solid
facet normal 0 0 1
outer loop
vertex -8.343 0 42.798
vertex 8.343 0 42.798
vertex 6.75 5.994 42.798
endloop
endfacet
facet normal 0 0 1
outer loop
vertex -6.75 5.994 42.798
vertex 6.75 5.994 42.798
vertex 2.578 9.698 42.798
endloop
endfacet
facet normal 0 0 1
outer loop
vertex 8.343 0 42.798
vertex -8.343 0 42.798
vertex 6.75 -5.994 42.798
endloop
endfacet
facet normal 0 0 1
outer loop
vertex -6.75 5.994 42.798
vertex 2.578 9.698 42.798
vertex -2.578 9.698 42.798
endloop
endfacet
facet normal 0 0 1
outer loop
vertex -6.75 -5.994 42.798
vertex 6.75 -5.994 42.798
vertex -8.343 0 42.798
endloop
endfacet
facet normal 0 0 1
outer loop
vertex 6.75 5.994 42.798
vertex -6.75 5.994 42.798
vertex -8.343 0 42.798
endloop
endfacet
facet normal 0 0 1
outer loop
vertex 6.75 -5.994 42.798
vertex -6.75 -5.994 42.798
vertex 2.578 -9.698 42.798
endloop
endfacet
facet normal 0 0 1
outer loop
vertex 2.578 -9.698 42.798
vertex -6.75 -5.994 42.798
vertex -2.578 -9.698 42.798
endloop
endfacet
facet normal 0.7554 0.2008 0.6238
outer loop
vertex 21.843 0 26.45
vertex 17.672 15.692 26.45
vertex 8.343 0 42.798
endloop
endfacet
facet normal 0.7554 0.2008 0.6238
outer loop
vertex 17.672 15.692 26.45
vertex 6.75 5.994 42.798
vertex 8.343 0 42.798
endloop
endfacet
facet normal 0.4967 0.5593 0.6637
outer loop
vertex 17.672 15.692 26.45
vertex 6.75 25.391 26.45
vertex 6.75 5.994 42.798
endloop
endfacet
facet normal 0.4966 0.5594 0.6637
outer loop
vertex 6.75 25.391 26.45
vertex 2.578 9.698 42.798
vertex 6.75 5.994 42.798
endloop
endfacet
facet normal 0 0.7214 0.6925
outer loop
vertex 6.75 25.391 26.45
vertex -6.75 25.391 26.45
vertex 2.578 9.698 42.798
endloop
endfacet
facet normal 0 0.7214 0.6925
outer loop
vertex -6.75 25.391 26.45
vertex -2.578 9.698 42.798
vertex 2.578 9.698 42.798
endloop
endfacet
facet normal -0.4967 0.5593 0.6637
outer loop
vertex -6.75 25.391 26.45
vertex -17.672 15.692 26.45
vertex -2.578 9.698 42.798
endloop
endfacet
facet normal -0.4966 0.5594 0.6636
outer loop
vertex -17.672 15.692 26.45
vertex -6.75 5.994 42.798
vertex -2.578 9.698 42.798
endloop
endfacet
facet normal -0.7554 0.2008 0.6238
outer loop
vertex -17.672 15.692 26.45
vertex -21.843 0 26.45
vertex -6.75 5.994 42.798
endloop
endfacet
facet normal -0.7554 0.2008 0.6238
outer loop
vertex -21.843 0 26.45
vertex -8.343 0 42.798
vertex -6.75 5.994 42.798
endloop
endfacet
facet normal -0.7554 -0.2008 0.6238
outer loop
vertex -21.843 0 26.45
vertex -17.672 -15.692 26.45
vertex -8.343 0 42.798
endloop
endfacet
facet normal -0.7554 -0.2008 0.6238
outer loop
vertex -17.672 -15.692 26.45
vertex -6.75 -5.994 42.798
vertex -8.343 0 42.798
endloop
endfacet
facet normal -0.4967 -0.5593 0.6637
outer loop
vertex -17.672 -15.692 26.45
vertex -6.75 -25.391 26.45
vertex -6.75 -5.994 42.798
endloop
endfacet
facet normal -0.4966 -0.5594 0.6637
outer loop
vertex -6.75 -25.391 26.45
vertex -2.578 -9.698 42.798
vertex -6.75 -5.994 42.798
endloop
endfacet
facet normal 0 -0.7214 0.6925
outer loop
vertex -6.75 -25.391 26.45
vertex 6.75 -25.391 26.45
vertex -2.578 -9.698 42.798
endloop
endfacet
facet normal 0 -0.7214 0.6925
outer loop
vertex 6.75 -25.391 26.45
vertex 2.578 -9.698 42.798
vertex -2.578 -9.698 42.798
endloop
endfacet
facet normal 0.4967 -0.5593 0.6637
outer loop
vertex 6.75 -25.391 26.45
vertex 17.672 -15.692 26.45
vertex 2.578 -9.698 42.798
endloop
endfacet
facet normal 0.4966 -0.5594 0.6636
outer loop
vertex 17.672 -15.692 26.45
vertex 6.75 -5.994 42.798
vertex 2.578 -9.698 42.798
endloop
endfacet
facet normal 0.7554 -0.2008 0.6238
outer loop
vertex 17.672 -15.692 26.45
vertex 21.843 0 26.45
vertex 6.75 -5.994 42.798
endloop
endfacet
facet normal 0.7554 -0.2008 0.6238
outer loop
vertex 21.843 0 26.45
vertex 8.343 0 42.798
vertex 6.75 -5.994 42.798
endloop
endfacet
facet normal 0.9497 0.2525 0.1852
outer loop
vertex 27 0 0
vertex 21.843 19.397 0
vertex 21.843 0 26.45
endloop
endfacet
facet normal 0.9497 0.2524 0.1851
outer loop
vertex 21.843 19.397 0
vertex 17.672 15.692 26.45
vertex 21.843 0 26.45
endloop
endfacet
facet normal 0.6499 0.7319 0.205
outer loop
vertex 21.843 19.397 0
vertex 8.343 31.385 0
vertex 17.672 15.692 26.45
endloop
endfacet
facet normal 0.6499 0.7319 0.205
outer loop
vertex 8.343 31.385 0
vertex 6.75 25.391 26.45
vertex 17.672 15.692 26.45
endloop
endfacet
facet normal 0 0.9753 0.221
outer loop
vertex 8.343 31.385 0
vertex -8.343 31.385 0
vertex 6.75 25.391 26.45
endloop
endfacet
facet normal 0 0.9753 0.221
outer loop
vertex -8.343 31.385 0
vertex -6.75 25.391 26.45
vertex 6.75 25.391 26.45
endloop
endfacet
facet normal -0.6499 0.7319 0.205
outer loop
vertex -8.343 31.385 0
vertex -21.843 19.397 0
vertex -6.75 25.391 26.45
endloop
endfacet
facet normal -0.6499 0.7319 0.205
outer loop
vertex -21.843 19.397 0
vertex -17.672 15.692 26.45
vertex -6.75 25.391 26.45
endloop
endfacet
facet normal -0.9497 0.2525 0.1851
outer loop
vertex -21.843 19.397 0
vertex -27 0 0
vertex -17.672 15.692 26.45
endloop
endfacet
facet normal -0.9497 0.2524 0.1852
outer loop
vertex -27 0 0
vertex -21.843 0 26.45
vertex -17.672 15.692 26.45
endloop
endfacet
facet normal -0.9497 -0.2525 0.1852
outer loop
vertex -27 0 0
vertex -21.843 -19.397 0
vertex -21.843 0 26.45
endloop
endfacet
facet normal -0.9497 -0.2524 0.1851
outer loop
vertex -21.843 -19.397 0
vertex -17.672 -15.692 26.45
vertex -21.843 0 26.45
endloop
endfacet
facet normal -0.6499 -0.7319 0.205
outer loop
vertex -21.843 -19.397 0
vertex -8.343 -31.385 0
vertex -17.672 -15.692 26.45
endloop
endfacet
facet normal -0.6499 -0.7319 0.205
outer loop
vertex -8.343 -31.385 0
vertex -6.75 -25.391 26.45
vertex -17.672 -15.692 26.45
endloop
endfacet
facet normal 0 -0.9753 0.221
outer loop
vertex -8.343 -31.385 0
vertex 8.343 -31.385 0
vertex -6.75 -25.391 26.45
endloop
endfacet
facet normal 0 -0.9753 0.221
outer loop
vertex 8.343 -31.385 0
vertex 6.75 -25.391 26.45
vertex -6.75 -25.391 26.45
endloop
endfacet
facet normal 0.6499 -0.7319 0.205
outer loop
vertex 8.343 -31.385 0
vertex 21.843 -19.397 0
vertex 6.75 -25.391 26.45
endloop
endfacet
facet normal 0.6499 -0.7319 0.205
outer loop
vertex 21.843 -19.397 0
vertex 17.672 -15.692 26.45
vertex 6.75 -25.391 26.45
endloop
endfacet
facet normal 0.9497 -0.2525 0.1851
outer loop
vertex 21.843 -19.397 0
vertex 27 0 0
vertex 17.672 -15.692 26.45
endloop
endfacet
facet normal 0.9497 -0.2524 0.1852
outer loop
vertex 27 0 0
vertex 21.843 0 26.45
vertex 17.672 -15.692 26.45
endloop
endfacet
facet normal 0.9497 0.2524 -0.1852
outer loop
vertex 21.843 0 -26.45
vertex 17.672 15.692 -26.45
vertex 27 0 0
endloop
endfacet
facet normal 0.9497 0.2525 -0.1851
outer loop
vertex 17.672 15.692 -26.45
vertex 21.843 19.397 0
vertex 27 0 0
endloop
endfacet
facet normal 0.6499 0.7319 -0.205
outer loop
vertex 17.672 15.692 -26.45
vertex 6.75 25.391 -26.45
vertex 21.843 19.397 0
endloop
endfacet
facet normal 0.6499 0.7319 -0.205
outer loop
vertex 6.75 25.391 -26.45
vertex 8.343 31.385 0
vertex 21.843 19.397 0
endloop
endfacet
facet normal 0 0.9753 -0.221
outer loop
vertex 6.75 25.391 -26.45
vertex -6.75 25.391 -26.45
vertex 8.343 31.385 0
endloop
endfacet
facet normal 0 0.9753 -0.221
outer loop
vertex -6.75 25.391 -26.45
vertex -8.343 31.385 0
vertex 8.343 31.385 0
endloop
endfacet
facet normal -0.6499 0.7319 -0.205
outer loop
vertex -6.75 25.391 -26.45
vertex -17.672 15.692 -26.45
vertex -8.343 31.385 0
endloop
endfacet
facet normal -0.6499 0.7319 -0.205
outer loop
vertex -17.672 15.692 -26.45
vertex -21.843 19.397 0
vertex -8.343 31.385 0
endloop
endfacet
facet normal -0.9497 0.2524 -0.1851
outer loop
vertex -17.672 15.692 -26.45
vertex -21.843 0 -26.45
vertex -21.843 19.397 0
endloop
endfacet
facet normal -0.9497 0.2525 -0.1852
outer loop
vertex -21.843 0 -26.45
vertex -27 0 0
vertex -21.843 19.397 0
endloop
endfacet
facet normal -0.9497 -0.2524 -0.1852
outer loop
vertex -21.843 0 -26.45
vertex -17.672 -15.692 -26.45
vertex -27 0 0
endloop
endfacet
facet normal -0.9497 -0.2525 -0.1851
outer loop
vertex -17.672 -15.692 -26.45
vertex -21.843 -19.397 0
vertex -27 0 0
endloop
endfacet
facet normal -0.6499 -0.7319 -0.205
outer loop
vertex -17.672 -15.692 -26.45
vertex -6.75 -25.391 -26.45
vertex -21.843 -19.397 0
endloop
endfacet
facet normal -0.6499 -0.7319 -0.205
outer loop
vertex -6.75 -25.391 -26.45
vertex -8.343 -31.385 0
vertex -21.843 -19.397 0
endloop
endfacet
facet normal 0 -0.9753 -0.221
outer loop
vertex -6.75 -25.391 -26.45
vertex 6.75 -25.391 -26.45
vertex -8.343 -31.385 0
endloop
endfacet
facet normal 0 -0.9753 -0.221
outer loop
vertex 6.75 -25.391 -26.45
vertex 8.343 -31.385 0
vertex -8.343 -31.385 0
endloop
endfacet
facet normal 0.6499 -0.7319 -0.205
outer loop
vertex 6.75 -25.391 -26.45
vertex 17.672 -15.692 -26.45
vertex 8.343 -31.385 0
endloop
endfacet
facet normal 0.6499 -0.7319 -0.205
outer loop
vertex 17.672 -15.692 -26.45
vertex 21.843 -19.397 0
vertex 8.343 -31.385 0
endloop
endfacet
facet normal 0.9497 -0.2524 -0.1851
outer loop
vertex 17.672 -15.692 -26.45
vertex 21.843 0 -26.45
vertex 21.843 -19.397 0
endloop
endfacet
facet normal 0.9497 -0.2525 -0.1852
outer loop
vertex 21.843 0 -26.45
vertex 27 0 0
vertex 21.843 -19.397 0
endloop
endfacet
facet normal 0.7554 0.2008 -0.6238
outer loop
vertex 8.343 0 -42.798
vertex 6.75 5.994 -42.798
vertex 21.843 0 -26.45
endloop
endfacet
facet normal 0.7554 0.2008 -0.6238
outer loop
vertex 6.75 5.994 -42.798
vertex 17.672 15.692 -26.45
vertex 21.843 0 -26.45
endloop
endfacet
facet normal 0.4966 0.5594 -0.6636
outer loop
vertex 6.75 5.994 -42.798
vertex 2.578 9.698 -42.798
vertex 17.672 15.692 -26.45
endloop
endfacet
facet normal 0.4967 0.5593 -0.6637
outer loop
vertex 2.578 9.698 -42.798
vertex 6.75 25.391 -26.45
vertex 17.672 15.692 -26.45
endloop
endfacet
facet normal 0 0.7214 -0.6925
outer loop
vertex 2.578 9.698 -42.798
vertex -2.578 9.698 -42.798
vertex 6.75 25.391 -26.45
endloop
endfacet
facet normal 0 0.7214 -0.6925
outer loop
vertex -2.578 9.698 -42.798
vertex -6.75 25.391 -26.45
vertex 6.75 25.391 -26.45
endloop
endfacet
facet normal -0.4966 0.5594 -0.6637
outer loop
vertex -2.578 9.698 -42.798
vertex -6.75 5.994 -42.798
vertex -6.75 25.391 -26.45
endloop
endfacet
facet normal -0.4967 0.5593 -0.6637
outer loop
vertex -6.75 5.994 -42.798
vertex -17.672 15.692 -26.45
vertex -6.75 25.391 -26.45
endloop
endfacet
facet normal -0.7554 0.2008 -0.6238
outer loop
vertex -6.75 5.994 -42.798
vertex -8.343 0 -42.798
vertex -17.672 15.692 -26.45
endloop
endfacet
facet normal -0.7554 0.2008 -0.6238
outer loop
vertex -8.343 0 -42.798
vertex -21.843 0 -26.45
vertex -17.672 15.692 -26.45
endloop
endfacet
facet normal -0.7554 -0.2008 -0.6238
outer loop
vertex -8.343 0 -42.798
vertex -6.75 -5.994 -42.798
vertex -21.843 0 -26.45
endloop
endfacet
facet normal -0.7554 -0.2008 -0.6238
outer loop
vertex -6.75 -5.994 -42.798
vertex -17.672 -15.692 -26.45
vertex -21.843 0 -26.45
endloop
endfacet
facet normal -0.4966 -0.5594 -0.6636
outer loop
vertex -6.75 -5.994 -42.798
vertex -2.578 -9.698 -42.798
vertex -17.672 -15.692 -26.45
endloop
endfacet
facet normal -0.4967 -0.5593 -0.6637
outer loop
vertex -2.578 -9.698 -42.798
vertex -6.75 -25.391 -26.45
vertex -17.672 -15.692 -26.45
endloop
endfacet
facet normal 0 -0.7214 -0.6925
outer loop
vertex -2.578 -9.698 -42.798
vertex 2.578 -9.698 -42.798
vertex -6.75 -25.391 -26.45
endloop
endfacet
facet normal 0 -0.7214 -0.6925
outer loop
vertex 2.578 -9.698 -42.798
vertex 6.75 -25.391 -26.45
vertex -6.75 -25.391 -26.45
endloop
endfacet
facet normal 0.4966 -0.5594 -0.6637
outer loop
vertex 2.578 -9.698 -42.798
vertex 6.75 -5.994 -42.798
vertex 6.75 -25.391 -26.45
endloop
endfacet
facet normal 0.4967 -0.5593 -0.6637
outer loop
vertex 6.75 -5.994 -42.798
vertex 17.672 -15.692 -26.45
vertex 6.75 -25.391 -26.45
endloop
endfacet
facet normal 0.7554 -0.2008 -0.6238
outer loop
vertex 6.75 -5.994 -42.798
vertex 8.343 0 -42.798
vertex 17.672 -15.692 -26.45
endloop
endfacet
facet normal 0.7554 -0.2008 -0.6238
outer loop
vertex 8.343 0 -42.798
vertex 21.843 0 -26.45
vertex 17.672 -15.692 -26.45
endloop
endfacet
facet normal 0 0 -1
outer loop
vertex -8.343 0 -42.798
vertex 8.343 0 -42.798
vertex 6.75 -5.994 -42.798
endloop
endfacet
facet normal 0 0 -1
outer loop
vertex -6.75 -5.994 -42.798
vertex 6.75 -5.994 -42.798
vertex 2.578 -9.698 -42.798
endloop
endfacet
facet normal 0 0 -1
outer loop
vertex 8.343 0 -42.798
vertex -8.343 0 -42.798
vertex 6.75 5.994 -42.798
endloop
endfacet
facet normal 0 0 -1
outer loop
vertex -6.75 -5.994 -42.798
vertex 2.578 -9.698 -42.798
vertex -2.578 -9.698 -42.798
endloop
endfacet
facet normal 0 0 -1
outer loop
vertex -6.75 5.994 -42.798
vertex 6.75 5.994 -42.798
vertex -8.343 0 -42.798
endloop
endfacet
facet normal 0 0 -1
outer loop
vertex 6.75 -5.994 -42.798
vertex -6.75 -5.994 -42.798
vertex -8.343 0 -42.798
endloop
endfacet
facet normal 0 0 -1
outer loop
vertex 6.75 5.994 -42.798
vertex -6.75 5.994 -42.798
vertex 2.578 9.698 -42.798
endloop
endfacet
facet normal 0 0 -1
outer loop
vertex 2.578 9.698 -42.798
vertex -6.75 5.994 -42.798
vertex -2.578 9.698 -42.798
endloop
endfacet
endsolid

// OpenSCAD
// Generated by SolidPython 1.0.1 on 2020-07-29 00:46:48


scale(v = [9, 11, 15]) {
	sphere(r = 3);
}
/***********************************************
*********      SolidPython code:      **********
************************************************
 
# import packages: SolidPython
from solid import *
from solid.utils import *
from itertools import chain, combinations, permutations


class Resize:

    def __init__(self, scad_file):
        self.scad_file = scad_file
        #self.scad_file = import_scad(scad_file)
        # cone/cylinder param:
        self.r1 = 0
        self.r2 = 0
        self.h = 0
        # rectangular prism param:
        self.w = 0
        self.l = 0
        # ellipse param:
        self.r = 0

    # import OpenScad code (file name corresponds to shape)


    # classify shape + parameters
    def assign(self, param1, param2, param3):
        if self.scad_file == 'cone.scad':
            self.r1 = param1
            self.r2 = param2
            self.h = param3
        elif self.scad_file == 'cylinder.scad':
            self.r1 = param1
            self.r2 = param2
            self.h = param3
        elif self.scad_file == 'rectangularPrism.scad':
            self.h = param1
            self.l = param2
            self.w = param3
        else:
            self.r = param1
            self.h = param2

    # resize parameters
    def iterate(self):
        x = range(3, 20, 2)
        i = 1
        if self.scad_file == 'cone.scad':
            tempList = list(permutations(x, 2))
            for temp in tempList:
                param1 = temp[0]
                param2 = temp[1]
                filepath = 'produced_scad_files/' + 'cone' + str(param1) + '_' + str(param2) + '_' + '.scad'
                scad_render_to_file(cylinder(h=param1, r1=param2, r2=0), filepath)

        elif self.scad_file == 'cylinder.scad':
            tempList = list(permutations(x, 3))
            for temp in tempList:
                param1 = temp[0]
                param2 = temp[1]
                filepath = 'produced_scad_files/' + 'cylinder' + str(param1) + '_' + str(param2) + '_' + '.scad'
                scad_render_to_file(cylinder(h=param1, r1=param2, r2=param2), filepath)

        elif self.scad_file == 'rectangularPrism.scad':
            tempList = list(permutations(x, 3))
            for temp in tempList:
                param1 = temp[0]
                param2 = temp[1]
                param3 = temp[2]
                filepath = 'produced_scad_files/' + 'rectangularPrism' + str(param1) + '_' + str(param2) + '_' + str(
                    param3) + '.scad'
                scad_render_to_file(cube(size=(param1, param2, param3)), filepath)

        elif self.scad_file == 'ellipse.scad':
            tempList = list(permutations(x, 4))
            for temp in tempList:
                param1 = temp[0]
                param2 = temp[1]
                param3 = temp[2]
                param4 = temp[3]
                filepath = 'produced_scad_files/' + 'ellipse' + str(param1) + '_' + str(param2) + '_' + str(param3) + '_' + str(param4) + '.scad'
                scad_render_to_file(scale([param1, param2, param3])(sphere(r=param4)), filepath)

    def render_to_scadfile(self):
        scad_render_to_file(scad, 'example.scad') 
 
************************************************/
